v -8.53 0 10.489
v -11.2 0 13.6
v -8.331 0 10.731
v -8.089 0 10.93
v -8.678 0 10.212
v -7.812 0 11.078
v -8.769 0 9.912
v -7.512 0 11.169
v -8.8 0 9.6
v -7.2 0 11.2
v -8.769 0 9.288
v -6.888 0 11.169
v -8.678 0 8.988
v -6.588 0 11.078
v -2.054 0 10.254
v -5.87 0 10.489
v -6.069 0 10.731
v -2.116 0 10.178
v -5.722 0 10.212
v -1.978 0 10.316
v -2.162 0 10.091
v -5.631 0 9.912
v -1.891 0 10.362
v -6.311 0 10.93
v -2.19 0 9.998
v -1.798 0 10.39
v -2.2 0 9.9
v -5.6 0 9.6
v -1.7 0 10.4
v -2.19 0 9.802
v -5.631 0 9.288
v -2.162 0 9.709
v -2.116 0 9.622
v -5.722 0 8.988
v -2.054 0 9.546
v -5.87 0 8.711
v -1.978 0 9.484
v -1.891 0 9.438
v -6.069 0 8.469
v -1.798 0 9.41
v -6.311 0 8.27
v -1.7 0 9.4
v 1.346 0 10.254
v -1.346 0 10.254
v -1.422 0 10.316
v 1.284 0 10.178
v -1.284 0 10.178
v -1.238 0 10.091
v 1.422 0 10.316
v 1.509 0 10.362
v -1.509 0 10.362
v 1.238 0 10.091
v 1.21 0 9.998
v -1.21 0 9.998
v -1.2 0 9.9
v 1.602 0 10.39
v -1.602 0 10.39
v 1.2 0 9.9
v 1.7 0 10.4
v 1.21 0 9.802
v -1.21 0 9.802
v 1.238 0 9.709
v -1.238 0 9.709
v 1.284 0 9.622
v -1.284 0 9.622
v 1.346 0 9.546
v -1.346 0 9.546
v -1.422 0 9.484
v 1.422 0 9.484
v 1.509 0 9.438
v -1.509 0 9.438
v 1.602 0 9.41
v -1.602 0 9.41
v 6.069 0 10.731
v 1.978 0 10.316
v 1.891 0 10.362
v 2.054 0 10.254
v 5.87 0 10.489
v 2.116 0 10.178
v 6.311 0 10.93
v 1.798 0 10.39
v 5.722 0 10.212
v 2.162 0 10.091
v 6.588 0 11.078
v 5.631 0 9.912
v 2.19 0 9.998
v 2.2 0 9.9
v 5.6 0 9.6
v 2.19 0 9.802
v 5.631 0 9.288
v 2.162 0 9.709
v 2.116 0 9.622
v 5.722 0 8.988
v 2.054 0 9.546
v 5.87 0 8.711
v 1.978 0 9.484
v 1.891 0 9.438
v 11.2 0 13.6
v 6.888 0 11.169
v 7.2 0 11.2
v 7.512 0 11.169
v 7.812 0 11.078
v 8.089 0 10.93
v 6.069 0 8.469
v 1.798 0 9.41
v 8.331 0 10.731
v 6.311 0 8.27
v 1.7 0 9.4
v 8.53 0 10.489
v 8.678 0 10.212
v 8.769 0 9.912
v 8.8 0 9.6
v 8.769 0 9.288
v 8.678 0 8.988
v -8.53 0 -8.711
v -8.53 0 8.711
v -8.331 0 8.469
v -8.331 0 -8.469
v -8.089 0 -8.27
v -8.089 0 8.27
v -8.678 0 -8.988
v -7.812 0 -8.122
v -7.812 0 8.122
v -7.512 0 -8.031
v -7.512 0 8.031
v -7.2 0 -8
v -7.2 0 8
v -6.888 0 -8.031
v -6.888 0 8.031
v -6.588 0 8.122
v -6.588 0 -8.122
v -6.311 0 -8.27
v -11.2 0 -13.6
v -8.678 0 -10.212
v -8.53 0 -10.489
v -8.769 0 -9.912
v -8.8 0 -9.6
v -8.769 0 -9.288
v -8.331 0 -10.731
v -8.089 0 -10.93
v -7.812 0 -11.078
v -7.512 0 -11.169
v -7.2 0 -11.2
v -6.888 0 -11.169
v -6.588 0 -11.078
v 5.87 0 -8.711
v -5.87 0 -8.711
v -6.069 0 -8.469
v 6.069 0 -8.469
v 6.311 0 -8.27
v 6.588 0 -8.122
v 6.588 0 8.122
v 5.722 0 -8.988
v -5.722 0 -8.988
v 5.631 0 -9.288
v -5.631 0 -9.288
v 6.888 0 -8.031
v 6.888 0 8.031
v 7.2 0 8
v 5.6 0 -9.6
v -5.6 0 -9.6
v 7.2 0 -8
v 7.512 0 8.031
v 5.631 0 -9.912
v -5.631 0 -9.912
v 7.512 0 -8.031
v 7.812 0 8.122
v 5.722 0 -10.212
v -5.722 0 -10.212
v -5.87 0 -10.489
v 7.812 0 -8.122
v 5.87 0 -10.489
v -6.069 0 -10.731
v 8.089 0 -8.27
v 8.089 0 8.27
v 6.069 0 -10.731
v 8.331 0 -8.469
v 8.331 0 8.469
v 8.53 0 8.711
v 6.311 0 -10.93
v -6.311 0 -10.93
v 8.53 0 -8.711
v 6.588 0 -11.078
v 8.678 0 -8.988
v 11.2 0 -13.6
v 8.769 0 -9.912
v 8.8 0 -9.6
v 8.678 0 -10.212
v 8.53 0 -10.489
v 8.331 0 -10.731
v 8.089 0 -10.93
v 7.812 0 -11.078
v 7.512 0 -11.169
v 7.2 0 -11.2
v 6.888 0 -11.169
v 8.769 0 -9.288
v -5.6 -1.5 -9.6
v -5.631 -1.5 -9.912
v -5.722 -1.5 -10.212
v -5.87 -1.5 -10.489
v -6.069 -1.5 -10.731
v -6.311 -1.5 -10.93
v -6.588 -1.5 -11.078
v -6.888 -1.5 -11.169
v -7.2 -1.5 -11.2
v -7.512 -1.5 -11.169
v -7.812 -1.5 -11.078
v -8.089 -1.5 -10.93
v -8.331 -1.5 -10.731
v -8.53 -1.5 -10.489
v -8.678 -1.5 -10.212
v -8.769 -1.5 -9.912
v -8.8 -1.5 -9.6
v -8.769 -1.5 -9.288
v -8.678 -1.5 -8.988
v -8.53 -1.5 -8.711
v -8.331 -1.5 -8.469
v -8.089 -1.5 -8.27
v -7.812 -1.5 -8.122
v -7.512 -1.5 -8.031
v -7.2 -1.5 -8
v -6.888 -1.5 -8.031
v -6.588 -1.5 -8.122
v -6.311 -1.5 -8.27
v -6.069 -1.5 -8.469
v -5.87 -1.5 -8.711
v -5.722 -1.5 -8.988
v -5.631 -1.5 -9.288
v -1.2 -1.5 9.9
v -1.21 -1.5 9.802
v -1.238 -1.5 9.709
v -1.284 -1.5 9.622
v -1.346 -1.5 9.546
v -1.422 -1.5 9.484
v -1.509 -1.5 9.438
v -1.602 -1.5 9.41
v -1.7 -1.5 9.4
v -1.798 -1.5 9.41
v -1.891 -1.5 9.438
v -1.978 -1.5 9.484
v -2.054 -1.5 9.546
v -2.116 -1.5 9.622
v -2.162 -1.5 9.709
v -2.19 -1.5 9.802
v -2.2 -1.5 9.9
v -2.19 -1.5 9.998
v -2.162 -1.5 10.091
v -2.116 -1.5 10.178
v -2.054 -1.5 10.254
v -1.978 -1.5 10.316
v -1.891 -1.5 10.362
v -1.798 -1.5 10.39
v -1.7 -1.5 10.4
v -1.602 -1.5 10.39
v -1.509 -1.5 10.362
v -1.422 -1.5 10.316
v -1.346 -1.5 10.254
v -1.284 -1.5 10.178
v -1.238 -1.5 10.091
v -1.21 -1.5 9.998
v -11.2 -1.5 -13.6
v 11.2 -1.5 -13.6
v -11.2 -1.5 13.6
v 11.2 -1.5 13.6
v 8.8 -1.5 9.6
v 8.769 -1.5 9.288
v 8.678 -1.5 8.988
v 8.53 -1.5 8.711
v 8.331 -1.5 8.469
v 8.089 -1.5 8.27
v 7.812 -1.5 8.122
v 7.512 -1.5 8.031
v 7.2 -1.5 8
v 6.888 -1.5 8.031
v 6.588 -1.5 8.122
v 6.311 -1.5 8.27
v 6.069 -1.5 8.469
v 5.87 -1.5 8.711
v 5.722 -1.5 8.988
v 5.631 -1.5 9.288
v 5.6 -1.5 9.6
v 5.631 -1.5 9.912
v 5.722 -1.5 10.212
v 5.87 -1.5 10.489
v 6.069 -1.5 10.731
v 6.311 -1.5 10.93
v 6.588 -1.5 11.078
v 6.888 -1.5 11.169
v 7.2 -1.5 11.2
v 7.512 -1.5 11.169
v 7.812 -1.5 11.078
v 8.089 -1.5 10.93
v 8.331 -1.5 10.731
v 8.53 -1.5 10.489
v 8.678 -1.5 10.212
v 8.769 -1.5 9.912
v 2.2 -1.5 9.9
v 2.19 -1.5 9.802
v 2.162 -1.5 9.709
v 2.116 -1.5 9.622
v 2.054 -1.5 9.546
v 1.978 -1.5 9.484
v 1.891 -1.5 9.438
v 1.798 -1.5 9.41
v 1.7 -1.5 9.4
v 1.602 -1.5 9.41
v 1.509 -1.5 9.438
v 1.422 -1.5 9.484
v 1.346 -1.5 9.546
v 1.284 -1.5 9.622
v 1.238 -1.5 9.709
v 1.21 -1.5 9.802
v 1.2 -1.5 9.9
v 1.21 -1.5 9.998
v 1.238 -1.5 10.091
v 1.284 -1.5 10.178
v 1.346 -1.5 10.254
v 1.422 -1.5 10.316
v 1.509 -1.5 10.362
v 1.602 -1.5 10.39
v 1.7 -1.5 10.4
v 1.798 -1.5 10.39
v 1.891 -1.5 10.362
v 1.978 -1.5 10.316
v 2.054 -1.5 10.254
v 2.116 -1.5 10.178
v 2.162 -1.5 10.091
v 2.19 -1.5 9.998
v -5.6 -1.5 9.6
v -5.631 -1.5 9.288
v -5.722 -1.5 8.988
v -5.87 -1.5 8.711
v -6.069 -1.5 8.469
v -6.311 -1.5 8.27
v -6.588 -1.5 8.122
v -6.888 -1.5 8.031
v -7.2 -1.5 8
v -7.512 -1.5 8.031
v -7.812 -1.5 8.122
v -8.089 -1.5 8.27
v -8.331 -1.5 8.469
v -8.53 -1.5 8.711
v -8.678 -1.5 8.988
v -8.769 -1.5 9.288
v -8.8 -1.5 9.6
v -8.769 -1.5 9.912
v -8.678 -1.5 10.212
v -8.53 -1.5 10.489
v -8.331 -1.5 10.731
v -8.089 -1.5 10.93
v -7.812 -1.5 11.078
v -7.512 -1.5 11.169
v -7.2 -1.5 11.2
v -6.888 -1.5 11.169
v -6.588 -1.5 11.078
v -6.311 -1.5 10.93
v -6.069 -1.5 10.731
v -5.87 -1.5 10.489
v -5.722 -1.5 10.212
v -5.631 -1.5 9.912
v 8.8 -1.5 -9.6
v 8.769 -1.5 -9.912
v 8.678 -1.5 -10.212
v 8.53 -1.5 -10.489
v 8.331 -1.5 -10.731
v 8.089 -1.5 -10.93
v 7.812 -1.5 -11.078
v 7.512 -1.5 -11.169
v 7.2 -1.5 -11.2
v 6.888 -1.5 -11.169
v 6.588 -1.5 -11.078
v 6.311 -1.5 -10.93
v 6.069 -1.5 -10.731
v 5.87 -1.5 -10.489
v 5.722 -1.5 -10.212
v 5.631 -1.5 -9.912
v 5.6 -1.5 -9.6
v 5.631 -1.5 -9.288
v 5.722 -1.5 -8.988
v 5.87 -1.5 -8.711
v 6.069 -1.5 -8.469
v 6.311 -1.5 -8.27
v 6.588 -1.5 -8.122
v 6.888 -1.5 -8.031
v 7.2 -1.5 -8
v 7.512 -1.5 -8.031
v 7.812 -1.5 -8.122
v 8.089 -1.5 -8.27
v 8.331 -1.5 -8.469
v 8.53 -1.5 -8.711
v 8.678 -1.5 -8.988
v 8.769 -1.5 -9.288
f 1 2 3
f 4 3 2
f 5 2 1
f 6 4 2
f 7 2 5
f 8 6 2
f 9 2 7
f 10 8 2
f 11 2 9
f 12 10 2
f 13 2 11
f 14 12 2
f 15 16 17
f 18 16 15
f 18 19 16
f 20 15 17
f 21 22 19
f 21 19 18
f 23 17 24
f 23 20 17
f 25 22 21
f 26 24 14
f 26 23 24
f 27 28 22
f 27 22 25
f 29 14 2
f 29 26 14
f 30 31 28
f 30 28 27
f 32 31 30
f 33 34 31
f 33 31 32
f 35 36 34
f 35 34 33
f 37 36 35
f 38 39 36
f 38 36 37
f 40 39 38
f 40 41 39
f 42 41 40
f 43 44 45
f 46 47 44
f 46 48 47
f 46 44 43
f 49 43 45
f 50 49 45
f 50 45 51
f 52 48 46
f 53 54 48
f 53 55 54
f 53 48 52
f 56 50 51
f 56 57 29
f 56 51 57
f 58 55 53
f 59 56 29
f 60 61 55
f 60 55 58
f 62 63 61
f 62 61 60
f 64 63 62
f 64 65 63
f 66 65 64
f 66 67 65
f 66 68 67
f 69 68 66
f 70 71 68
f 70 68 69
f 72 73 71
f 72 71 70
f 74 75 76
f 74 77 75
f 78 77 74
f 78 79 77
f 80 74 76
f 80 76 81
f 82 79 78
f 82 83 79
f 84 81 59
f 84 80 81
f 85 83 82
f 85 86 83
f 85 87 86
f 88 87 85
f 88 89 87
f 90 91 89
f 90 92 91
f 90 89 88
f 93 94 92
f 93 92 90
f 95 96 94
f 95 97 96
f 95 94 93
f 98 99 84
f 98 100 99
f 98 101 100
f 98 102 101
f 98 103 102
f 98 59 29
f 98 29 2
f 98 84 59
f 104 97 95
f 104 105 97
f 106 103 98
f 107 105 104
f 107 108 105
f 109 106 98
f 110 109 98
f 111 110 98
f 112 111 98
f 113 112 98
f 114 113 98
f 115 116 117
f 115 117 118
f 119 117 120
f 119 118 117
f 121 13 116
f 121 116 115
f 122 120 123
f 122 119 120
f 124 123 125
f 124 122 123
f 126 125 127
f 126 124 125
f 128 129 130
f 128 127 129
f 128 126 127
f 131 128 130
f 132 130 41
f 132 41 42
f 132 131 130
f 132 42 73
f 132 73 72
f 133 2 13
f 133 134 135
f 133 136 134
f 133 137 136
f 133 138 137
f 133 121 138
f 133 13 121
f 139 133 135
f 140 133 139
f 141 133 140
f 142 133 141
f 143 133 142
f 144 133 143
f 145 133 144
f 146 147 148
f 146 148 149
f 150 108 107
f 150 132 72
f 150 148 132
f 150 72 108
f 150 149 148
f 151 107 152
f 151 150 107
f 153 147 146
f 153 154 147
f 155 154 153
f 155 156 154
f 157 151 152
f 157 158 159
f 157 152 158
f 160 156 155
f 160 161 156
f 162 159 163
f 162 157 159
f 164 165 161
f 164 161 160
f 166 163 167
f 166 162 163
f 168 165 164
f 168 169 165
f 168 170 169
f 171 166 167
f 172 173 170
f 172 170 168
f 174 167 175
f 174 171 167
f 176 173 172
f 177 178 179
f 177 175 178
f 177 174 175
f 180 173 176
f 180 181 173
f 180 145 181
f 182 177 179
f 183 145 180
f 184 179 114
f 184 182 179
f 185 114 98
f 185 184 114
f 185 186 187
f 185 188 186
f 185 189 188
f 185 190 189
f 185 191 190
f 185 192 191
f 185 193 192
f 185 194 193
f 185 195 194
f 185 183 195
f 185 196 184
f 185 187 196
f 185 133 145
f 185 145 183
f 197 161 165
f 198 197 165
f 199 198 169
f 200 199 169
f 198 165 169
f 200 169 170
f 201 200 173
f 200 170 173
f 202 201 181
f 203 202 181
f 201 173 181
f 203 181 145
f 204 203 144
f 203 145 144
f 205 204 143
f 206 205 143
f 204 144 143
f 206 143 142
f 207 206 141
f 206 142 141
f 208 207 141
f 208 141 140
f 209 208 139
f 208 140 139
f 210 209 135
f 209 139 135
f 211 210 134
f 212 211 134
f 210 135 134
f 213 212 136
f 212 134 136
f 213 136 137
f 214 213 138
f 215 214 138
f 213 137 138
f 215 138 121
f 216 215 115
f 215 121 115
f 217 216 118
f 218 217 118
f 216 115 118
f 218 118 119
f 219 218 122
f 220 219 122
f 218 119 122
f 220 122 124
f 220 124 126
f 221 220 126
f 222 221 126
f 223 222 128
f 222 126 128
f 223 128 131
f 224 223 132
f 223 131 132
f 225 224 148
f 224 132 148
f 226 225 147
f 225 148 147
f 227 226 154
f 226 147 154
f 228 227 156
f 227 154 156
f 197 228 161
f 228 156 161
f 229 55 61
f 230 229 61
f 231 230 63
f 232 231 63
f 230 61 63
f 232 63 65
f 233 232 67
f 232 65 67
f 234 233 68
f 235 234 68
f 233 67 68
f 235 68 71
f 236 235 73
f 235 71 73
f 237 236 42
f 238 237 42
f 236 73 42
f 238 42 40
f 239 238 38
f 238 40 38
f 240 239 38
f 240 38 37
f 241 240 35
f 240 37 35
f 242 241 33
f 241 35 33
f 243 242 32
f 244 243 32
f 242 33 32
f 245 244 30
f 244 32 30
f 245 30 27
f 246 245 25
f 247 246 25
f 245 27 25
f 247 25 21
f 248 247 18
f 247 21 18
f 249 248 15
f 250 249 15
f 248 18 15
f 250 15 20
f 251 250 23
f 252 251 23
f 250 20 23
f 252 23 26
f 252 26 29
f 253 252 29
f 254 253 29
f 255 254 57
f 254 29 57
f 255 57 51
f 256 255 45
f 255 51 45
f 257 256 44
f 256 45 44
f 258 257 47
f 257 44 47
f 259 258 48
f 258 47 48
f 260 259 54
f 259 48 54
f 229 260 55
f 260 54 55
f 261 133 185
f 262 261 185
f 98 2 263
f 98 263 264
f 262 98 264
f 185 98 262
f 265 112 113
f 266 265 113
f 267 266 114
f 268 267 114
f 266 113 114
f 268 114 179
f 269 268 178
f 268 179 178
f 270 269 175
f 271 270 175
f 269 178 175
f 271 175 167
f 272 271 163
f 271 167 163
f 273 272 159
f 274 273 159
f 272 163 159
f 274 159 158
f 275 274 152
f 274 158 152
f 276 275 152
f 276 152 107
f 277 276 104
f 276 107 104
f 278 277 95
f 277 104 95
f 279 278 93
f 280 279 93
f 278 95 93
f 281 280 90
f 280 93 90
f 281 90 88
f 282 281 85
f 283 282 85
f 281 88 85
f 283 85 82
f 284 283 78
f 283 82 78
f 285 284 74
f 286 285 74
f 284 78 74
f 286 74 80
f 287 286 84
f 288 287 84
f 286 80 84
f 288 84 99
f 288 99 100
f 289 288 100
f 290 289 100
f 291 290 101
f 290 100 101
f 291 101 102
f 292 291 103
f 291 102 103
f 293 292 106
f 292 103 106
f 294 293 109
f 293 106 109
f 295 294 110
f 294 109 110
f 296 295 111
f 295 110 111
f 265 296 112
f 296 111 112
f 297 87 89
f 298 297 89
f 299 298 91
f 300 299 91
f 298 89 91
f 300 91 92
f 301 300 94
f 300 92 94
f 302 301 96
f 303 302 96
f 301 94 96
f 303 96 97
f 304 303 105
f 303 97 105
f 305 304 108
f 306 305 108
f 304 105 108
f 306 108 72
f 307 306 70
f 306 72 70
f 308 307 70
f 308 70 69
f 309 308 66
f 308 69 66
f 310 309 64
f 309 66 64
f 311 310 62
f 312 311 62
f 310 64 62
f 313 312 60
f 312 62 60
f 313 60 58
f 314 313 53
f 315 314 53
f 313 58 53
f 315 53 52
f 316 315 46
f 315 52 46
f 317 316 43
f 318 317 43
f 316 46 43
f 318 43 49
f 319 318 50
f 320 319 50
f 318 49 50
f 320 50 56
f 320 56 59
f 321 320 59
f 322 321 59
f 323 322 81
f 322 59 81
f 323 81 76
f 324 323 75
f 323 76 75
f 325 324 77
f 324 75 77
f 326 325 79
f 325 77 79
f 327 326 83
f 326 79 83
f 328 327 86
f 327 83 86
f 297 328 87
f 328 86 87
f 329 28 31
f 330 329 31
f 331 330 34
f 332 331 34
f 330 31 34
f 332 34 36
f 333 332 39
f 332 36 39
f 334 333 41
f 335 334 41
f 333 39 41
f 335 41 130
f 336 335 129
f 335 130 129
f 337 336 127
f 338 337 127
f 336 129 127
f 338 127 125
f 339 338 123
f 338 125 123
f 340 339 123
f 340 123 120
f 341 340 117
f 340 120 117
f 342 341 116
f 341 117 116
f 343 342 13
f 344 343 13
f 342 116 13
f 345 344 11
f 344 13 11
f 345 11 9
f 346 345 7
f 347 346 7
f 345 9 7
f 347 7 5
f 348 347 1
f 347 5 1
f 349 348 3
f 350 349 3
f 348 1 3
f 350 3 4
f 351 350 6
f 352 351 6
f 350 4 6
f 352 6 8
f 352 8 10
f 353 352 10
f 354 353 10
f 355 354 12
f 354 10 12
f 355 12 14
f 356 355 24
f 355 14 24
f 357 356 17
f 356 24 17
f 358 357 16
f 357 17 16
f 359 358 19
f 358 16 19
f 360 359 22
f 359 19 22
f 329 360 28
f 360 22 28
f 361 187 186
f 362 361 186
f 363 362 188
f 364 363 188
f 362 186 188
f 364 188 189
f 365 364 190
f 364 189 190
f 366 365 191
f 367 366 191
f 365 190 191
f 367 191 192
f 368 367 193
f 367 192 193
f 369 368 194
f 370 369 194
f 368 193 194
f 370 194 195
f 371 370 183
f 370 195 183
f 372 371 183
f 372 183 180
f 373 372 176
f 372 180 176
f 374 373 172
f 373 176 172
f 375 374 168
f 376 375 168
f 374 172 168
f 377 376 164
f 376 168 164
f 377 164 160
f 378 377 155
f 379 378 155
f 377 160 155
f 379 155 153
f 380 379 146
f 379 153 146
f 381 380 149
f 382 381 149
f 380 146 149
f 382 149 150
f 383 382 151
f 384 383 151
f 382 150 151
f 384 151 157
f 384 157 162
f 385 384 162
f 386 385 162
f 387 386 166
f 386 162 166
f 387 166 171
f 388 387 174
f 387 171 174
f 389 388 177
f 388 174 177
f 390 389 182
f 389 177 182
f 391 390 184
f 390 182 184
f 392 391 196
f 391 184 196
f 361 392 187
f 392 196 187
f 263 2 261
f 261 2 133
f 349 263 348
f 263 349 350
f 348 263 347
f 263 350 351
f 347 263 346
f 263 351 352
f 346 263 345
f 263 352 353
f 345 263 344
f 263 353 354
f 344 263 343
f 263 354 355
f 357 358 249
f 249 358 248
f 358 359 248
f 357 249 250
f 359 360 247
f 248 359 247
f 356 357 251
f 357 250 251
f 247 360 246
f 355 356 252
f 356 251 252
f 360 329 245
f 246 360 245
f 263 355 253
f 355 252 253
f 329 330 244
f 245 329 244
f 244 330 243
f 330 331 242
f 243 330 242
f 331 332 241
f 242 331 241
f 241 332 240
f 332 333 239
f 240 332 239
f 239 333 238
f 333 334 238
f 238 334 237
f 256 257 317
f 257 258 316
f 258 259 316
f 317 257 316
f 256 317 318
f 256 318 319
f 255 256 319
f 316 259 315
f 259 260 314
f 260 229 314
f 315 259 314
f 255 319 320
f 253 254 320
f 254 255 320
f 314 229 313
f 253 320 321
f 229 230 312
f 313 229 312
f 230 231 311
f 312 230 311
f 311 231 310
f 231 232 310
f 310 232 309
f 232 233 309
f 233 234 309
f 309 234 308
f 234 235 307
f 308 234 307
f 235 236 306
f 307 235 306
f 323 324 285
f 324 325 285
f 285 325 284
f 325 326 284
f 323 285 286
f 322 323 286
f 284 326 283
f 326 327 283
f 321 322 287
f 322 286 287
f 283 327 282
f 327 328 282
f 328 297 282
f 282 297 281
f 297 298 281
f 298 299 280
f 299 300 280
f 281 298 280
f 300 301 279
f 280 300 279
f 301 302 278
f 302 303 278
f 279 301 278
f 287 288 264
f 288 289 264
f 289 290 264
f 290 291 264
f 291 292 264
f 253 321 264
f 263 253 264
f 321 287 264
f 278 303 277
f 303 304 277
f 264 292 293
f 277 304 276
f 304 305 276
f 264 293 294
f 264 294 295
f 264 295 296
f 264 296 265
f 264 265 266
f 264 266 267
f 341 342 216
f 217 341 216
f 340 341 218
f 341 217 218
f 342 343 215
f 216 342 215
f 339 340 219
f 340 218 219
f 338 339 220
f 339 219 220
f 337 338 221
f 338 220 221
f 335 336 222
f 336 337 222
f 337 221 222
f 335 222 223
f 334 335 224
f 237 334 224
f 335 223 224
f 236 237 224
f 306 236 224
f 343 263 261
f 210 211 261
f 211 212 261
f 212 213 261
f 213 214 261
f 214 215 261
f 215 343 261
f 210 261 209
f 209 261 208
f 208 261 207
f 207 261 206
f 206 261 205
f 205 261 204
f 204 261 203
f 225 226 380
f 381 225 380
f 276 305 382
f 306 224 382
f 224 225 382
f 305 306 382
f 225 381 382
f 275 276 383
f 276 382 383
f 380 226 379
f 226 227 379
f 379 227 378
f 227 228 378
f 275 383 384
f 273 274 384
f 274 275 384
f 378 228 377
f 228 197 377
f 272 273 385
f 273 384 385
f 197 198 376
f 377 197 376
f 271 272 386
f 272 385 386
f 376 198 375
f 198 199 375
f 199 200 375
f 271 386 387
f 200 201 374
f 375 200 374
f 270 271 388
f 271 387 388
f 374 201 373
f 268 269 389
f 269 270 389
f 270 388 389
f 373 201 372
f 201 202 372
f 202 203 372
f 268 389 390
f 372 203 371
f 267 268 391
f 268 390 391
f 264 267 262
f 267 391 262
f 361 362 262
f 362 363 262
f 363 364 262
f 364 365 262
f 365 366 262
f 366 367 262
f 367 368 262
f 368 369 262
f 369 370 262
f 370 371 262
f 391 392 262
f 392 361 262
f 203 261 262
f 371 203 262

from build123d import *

# Parameters (mm, degrees)
SKETCH1_W           = 22.4
SKETCH1_H           = 27.2
SKETCH1_R           = 1.6
SKETCH1_R_2         = 0.5
BOSS_EXTRUDE1_DEPTH = 1.5


with BuildPart() as part:
    # Sketch1 → Boss-Extrude1 (new body)
    with BuildSketch(Plane(origin=(0, 0, 0), x_dir=(1, 0, 0), z_dir=(0, 1, 0))):
        Rectangle(SKETCH1_W, SKETCH1_H)
        with Locations((7.2, 9.6)):
            Circle(SKETCH1_R, mode=Mode.SUBTRACT)
        with Locations((-7.2, 9.6)):
            Circle(SKETCH1_R, mode=Mode.SUBTRACT)
        with Locations((-7.2, -9.6)):
            Circle(SKETCH1_R, mode=Mode.SUBTRACT)
        with Locations((-1.7, -9.9)):
            Circle(SKETCH1_R_2, mode=Mode.SUBTRACT)
        with Locations((1.7, -9.9)):
            Circle(SKETCH1_R_2, mode=Mode.SUBTRACT)
        with Locations((7.2, -9.6)):
            Circle(SKETCH1_R, mode=Mode.SUBTRACT)
    extrude(amount=-BOSS_EXTRUDE1_DEPTH)


solid = part.part
